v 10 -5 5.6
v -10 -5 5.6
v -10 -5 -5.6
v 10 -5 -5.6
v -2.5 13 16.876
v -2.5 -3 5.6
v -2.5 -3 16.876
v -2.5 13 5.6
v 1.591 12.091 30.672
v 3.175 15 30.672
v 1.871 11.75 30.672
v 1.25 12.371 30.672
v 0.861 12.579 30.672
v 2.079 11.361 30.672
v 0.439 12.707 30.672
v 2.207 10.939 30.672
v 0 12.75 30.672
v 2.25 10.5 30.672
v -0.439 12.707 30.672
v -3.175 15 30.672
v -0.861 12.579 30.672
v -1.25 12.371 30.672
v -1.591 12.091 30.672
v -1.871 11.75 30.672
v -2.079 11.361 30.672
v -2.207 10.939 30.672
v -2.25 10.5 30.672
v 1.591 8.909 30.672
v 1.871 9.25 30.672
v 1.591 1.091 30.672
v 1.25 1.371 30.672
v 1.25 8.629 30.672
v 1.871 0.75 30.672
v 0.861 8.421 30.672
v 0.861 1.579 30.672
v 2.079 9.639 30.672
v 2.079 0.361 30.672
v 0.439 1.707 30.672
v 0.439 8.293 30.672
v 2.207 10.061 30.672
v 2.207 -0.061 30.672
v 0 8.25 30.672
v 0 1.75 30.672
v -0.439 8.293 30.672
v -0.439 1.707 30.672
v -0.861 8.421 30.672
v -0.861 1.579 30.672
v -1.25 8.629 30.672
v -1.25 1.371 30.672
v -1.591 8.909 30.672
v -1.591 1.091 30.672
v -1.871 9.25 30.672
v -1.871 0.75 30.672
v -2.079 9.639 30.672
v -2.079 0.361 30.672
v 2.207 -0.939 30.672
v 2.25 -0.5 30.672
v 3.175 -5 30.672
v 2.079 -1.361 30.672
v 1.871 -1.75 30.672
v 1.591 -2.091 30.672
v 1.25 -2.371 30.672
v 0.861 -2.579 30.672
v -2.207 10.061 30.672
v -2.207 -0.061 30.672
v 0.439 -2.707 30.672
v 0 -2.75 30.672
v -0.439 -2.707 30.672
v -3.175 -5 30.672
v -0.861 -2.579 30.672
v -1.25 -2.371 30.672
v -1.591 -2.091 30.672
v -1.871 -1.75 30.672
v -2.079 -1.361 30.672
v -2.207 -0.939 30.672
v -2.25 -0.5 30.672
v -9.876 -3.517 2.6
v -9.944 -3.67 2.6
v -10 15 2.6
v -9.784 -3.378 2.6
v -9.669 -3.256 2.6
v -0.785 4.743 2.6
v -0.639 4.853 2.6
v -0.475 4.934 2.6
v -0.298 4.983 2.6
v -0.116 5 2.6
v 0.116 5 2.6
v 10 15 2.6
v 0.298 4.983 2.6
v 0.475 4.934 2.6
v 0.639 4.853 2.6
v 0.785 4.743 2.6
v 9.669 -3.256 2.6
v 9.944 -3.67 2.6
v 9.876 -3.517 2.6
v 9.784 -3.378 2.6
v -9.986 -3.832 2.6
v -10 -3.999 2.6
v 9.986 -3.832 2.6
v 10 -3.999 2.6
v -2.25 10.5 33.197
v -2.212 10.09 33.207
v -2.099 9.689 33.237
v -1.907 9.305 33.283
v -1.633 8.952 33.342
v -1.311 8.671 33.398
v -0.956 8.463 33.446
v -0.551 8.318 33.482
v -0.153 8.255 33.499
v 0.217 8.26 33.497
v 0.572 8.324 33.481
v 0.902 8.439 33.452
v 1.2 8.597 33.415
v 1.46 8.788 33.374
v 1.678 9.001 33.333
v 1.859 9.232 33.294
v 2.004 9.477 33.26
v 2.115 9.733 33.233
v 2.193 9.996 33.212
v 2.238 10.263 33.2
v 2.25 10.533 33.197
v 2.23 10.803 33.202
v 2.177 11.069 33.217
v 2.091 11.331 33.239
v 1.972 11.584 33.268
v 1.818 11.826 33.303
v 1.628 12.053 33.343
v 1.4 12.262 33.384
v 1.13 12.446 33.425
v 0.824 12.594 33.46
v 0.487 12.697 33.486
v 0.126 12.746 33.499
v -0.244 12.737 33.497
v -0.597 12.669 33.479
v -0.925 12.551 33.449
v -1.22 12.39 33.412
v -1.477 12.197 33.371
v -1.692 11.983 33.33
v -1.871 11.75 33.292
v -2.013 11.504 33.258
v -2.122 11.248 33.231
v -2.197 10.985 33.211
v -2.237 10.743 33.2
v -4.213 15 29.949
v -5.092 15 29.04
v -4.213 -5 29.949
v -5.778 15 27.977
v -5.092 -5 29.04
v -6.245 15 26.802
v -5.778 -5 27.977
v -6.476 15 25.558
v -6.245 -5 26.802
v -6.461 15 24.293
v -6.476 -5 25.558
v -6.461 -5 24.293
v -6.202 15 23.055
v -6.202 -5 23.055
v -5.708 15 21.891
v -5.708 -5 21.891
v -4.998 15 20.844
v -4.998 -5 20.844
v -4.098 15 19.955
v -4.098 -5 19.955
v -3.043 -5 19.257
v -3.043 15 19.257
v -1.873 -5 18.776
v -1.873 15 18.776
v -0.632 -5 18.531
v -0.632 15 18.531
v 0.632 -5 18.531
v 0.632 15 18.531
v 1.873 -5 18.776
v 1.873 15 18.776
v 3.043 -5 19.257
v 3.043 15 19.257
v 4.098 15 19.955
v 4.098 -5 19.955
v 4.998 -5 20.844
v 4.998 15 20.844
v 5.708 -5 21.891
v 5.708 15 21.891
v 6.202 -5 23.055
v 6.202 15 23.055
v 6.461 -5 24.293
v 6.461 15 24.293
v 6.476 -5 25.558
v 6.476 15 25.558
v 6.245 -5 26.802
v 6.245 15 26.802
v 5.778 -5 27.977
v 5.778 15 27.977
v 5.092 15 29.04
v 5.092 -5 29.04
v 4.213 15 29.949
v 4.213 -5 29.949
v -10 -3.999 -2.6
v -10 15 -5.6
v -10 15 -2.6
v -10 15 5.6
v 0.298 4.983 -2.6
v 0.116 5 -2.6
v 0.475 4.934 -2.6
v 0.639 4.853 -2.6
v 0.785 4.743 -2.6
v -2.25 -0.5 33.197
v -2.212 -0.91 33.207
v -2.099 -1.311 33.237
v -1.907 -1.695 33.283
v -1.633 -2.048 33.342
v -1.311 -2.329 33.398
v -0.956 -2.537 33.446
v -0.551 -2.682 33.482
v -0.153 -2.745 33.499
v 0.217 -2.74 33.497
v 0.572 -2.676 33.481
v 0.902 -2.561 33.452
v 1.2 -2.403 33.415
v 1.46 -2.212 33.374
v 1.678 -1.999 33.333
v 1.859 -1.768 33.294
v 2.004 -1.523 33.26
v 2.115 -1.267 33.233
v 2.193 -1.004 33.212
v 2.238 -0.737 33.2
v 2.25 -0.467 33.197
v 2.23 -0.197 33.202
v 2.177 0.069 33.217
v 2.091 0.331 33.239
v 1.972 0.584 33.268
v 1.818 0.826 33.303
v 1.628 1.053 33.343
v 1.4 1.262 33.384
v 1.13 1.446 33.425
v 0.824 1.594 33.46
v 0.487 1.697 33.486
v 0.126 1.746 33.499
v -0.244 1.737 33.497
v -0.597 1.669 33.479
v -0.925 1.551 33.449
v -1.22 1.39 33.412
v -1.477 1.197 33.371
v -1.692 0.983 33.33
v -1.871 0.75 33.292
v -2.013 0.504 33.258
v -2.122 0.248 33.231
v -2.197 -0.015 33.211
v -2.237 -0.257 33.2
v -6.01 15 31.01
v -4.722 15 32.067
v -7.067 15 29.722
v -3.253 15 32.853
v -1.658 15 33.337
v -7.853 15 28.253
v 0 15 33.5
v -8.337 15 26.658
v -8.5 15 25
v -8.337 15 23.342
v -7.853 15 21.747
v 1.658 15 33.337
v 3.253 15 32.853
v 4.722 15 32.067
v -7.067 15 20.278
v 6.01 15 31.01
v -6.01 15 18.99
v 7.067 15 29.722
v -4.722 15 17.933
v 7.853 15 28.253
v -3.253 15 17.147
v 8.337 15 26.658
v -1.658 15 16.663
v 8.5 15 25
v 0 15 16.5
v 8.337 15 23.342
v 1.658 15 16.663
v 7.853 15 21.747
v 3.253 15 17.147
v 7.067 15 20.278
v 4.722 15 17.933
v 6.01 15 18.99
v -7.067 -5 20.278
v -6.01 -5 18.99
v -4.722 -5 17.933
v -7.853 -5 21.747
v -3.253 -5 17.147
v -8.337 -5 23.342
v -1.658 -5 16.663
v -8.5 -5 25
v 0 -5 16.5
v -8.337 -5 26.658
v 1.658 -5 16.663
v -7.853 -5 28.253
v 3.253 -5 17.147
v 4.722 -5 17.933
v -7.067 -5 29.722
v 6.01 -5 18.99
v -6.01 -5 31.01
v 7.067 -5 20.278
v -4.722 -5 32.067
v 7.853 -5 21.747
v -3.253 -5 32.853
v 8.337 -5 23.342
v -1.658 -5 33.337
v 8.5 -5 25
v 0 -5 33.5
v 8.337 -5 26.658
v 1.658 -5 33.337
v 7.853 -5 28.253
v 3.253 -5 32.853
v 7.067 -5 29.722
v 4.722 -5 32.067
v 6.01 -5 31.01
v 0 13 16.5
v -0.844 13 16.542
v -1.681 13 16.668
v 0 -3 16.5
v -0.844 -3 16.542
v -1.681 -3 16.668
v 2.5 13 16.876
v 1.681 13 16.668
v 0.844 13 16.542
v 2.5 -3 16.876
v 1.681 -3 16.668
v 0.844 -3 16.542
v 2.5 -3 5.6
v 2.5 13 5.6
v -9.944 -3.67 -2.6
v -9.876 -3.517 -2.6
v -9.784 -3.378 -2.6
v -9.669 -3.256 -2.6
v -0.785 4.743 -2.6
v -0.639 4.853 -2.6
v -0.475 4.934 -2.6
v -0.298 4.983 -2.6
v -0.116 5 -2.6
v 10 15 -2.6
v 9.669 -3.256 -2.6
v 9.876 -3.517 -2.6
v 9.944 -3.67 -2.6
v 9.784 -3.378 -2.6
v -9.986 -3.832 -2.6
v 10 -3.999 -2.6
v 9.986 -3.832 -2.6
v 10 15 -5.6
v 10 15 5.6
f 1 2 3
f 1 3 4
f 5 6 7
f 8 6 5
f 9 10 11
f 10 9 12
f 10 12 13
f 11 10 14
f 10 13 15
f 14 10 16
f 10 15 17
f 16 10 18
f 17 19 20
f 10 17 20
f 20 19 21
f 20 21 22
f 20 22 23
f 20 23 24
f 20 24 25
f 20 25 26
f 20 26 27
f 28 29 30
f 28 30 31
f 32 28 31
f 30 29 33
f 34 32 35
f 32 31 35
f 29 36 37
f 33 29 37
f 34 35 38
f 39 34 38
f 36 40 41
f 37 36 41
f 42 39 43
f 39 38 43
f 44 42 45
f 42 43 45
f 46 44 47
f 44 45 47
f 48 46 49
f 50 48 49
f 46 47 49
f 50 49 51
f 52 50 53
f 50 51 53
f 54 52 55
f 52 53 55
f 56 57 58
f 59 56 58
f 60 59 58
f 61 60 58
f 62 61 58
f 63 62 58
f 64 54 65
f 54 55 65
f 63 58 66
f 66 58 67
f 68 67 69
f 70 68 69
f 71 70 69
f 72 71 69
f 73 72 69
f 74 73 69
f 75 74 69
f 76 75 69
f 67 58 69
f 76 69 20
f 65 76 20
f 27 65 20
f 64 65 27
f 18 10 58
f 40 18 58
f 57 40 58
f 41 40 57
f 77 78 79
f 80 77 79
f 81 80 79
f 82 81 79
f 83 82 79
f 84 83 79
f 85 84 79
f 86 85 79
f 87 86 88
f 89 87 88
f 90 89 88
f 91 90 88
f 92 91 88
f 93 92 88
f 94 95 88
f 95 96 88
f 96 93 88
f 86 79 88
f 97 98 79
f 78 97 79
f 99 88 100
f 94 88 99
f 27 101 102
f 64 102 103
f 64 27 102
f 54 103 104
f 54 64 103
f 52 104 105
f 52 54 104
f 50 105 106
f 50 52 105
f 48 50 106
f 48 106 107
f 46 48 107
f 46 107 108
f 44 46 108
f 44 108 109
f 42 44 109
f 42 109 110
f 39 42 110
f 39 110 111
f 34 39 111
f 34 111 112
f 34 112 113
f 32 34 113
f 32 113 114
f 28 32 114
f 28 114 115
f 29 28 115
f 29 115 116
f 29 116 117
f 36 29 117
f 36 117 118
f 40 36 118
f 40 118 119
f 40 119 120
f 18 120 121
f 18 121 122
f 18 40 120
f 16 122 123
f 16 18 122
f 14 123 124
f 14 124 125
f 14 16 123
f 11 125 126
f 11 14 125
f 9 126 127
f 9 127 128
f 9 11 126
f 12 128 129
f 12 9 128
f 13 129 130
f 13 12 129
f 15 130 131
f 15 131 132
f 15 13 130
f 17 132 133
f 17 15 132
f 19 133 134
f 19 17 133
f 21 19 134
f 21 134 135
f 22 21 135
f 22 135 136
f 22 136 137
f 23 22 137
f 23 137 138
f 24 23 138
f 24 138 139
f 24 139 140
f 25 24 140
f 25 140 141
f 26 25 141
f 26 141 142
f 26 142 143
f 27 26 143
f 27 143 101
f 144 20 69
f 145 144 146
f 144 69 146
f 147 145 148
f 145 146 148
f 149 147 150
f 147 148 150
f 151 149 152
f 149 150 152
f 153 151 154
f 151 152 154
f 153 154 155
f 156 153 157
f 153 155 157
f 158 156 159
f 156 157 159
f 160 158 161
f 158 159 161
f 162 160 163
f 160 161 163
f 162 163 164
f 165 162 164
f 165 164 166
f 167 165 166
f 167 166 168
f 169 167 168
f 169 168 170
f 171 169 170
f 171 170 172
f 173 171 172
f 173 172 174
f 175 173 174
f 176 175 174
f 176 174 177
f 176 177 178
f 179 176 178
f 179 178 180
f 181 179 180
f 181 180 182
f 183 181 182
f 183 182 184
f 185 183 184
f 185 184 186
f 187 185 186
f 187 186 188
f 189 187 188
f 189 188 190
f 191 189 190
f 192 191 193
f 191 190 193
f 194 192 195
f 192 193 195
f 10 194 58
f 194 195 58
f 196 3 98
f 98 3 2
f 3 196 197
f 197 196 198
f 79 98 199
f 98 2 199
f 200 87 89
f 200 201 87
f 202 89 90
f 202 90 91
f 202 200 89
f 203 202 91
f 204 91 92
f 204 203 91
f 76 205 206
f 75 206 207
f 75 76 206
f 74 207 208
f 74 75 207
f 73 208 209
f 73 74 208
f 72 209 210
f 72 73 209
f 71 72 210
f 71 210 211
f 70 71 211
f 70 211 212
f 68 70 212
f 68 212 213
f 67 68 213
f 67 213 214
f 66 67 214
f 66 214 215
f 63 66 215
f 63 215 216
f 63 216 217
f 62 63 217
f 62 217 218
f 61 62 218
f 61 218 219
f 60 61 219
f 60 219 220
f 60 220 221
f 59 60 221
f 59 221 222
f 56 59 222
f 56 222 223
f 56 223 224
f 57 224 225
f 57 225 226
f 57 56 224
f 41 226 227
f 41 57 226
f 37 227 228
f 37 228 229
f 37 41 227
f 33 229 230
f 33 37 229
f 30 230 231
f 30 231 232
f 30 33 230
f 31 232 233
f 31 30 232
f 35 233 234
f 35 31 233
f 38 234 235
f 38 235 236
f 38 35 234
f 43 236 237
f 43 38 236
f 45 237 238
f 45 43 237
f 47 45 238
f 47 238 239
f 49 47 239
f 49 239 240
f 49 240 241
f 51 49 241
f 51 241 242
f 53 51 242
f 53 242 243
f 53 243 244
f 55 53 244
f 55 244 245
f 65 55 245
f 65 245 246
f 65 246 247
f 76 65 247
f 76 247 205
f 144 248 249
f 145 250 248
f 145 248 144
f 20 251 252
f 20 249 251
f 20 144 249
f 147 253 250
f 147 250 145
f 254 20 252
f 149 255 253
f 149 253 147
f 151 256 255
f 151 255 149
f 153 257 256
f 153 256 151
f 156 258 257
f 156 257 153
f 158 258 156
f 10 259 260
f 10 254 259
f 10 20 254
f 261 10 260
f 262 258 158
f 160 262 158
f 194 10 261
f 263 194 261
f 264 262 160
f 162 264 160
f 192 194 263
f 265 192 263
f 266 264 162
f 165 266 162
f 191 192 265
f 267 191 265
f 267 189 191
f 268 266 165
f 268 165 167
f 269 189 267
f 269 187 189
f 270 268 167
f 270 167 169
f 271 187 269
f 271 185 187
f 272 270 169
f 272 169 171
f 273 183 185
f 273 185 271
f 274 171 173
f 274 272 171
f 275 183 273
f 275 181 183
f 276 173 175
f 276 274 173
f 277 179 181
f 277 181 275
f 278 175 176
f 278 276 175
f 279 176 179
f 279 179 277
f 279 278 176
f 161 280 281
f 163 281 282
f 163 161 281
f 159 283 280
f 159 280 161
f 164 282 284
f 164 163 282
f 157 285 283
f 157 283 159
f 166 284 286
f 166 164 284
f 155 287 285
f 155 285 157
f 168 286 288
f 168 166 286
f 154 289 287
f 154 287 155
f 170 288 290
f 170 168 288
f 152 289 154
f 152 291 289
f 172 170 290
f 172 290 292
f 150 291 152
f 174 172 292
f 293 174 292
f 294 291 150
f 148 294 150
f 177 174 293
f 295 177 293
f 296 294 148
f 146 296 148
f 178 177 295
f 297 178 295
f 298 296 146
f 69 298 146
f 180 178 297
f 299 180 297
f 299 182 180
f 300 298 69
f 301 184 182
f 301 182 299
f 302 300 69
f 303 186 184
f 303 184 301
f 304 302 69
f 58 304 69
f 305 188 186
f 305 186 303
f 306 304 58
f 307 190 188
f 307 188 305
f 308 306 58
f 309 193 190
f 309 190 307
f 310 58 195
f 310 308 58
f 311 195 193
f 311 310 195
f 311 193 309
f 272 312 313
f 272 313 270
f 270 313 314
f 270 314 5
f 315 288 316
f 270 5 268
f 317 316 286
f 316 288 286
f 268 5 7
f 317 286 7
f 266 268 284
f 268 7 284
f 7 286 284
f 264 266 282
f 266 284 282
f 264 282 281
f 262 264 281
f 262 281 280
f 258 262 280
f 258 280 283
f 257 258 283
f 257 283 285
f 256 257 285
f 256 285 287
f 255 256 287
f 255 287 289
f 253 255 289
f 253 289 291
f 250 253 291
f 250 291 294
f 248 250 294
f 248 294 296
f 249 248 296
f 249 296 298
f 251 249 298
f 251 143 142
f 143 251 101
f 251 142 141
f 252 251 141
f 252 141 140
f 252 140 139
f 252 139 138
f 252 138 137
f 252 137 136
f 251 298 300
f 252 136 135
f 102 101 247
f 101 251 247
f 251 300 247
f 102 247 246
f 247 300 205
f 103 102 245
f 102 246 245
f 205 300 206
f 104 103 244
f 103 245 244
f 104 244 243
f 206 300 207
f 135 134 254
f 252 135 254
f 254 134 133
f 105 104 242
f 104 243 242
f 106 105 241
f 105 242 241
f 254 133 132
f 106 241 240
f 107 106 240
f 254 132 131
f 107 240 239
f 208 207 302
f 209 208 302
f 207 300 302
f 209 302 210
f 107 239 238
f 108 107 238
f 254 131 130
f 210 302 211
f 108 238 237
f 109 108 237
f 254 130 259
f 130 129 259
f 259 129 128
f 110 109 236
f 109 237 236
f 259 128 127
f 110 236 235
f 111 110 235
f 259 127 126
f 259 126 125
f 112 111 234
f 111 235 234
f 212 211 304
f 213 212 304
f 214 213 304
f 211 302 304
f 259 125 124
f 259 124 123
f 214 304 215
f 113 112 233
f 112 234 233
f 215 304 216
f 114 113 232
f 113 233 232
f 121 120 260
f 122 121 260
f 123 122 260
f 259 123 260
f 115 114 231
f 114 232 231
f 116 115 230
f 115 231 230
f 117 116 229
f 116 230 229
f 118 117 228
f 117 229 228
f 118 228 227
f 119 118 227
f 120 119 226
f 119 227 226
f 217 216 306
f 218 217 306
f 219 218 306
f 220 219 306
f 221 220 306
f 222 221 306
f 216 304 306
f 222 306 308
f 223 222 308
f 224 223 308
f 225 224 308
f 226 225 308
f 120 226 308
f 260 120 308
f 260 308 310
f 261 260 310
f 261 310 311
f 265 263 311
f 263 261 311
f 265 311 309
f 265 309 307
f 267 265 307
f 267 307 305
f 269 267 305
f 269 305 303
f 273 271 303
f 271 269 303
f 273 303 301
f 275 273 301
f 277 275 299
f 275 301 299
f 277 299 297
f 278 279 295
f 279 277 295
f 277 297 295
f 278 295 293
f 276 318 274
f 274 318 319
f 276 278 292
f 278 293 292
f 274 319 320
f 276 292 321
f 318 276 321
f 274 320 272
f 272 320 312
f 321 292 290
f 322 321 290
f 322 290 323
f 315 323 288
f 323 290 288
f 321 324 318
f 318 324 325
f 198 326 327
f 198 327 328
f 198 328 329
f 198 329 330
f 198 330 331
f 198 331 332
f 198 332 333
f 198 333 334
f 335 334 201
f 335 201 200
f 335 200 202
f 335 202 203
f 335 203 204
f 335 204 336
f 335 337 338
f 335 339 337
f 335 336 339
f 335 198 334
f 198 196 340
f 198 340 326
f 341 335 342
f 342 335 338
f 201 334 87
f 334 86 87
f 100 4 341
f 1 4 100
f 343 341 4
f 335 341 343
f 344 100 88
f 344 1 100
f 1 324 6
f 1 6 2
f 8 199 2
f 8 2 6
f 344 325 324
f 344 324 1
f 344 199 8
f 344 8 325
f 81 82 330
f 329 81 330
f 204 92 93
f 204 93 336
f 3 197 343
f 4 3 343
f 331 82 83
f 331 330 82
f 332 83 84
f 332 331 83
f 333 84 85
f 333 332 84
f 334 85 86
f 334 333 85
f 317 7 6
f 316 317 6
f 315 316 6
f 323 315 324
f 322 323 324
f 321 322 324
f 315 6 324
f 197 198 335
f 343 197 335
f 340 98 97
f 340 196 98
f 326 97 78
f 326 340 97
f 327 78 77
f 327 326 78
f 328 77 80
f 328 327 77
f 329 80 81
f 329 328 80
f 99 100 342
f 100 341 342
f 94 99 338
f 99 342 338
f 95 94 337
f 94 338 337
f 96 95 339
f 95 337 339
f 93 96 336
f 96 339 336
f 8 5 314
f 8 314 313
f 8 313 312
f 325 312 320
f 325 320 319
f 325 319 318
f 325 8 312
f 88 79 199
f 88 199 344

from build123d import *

# Parameters (mm, degrees)
SKETCH2_W                       = 20
SKETCH2_H                       = 10
BOSS_EXTRUDE1_DEPTH             = 2.6
CHAMFER1_SIZE                   = 9.5
CHAMFER1_SIZE2                  = 8.553838421
FILLET3_R                       = 1
SKETCH3_W                       = 20
SKETCH3_H                       = 20
BOSS_EXTRUDE2_DEPTH             = 3
BOSS_EXTRUDE3_REACH             = 20.877
SKETCH6_R                       = 8.5
BOSS_EXTRUDE3_DIRECTION_2_REACH = 20.877
BOSS_EXTRUDE4_REACH             = 35.218
BOSS_EXTRUDE4_END_RADIUS        = 8.5
SKETCH5_W                       = 5
SKETCH5_H                       = 16
CUT_EXTRUDE1_REACH              = 33.311
CUT_EXTRUDE1_END_RADIUS         = 8.5
SKETCH7_R                       = 2.25


with BuildPart() as part:
    # Sketch2 → Boss-Extrude1 (new, symmetric)
    with BuildSketch(Plane.XY):
        Rectangle(SKETCH2_W, SKETCH2_H)
    extrude(amount=BOSS_EXTRUDE1_DEPTH, both=True)

    # Chamfer1
    chamfer1_edges = [part.edges().sort_by_distance(p)[0] for p in [
        (-10, 5, 0),
        (10, 5, 0),
    ]]
    chamfer1_side = [part.faces().sort_by_distance(p)[0] for p in [
        (0, 5, 0),
    ]]
    chamfer(chamfer1_edges, length=CHAMFER1_SIZE, length2=CHAMFER1_SIZE2, reference=chamfer1_side[0])

    # Fillet3
    fillet3_edges = [part.edges().sort_by_distance(p)[0] for p in [
        (-0.5, 5, 0),
        (0.5, 5, 0),
        (10, -3.553838421, 0),
        (-10, -3.553838421, 0),
    ]]
    fillet(fillet3_edges, radius=FILLET3_R)

    # Sketch3 → Boss-Extrude2 (add)
    with BuildSketch(Plane.XY.offset(2.6)):
        with Locations((0, 5)):
            Rectangle(SKETCH3_W, SKETCH3_H)
    boss_extrude2 = extrude(amount=BOSS_EXTRUDE2_DEPTH)

    # Mirror1: Boss-Extrude2 across plane
    add(boss_extrude2.mirror(Plane.XY))


with BuildPart() as body_2:

    # Boss-Extrude3: up to this face of the body (flat: up to its plane)
    boss_extrude3_end = Plane(part.part.faces().sort_by_distance((0, 15, 4.1))[0])
    # Sketch6 → Boss-Extrude3 (new, up to the picked face)
    with BuildSketch(Plane(origin=(0, 0, 0), x_dir=(1, 0, 0), z_dir=(0, 1, 0)), mode=Mode.PRIVATE) as boss_extrude3_sk1:
        with Locations(Location((0, -25, 0), (0, 0, 90))):
            Circle(SKETCH6_R)
        with BuildLine():
            Line((3.175, -30.671805268), (-3.175, -30.671805268))
            ThreePointArc((-3.175, -30.671805268), (0, -18.5), (3.175, -30.671805268))
        make_face(mode=Mode.SUBTRACT)
    boss_extrude3_tool1 = split(extrude(boss_extrude3_sk1.sketch, amount=BOSS_EXTRUDE3_REACH, mode=Mode.PRIVATE), bisect_by=boss_extrude3_end, keep=Keep.BOTH, mode=Mode.PRIVATE)
    add(boss_extrude3_tool1.solids().sort_by(Axis((0, 0, 33.259584), (0, 1, 0)))[0])


    # Boss-Extrude3 direction 2: up to this face of the body (flat: up to its plane)
    boss_extrude3_direction_2_end = Plane(part.part.faces().sort_by_distance((0, -5, 0))[0])
    # Sketch6 → Boss-Extrude3 direction 2 (add, up to the picked face)
    with BuildSketch(Plane(origin=(0, 0, 0), x_dir=(1, 0, 0), z_dir=(0, 1, 0)), mode=Mode.PRIVATE) as boss_extrude3_direction_2_sk1:
        with Locations(Location((0, -25, 0), (0, 0, 90))):
            Circle(SKETCH6_R)
        with BuildLine():
            Line((3.175, -30.671805268), (-3.175, -30.671805268))
            ThreePointArc((-3.175, -30.671805268), (0, -18.5), (3.175, -30.671805268))
        make_face(mode=Mode.SUBTRACT)
    boss_extrude3_direction_2_tool1 = split(extrude(boss_extrude3_direction_2_sk1.sketch, amount=-BOSS_EXTRUDE3_DIRECTION_2_REACH, mode=Mode.PRIVATE), bisect_by=boss_extrude3_direction_2_end, keep=Keep.BOTH, mode=Mode.PRIVATE)
    add(boss_extrude3_direction_2_tool1.solids().sort_by(Axis((0, 0, 33.259584), (0, -1, 0)))[0])


with BuildPart() as part_1:
    add(part.part)

    add(body_2.part)  # Boss-Extrude4 merges body 2
    # Boss-Extrude4: up to this cylinder (the profile starts outside it)
    boss_extrude4_end = Plane(origin=(0, 5, 25), z_dir=(0, -1, 0)) * Cylinder(BOSS_EXTRUDE4_END_RADIUS, 88.436, mode=Mode.PRIVATE)
    # Sketch5 → Boss-Extrude4 (add, up to the surface)
    with BuildSketch(Plane.XY.offset(5.6), mode=Mode.PRIVATE) as boss_extrude4_sk1:
        with Locations((0, 5)):
            Rectangle(SKETCH5_W, SKETCH5_H)
    boss_extrude4_tool1 = extrude(boss_extrude4_sk1.sketch, amount=BOSS_EXTRUDE4_REACH, mode=Mode.PRIVATE) - boss_extrude4_end
    add(boss_extrude4_tool1.solids().sort_by_distance((0, 5, 5.6))[0])

    # Cut-Extrude1: up to this cylinder (the profile starts inside it)
    cut_extrude1_end = Plane(origin=(0, 5, 25), z_dir=(0, -1, 0)) * Cylinder(CUT_EXTRUDE1_END_RADIUS, 95.622, mode=Mode.PRIVATE)
    # Sketch7 → Cut-Extrude1 (cut, up to the surface)
    with BuildSketch(Plane.XY.offset(20), mode=Mode.PRIVATE) as cut_extrude1_sk1:
        with Locations(Location((0, 10.5, 0), (0, 0, 180))):
            Circle(SKETCH7_R)
    cut_extrude1_tool1 = extrude(cut_extrude1_sk1.sketch, amount=CUT_EXTRUDE1_REACH, mode=Mode.PRIVATE) & cut_extrude1_end
    add(cut_extrude1_tool1.solids().sort_by_distance((0, 10.5, 20))[0], mode=Mode.SUBTRACT)
    # Sketch7 → Cut-Extrude1 (cut, up to the surface)
    with BuildSketch(Plane.XY.offset(20), mode=Mode.PRIVATE) as cut_extrude1_sk2:
        with Locations(Location((0, -0.5, 0), (0, 0, 180))):
            Circle(SKETCH7_R)
    cut_extrude1_tool2 = extrude(cut_extrude1_sk2.sketch, amount=CUT_EXTRUDE1_REACH, mode=Mode.PRIVATE) & cut_extrude1_end
    add(cut_extrude1_tool2.solids().sort_by_distance((0, -0.5, 20))[0], mode=Mode.SUBTRACT)


solid = part_1.part
